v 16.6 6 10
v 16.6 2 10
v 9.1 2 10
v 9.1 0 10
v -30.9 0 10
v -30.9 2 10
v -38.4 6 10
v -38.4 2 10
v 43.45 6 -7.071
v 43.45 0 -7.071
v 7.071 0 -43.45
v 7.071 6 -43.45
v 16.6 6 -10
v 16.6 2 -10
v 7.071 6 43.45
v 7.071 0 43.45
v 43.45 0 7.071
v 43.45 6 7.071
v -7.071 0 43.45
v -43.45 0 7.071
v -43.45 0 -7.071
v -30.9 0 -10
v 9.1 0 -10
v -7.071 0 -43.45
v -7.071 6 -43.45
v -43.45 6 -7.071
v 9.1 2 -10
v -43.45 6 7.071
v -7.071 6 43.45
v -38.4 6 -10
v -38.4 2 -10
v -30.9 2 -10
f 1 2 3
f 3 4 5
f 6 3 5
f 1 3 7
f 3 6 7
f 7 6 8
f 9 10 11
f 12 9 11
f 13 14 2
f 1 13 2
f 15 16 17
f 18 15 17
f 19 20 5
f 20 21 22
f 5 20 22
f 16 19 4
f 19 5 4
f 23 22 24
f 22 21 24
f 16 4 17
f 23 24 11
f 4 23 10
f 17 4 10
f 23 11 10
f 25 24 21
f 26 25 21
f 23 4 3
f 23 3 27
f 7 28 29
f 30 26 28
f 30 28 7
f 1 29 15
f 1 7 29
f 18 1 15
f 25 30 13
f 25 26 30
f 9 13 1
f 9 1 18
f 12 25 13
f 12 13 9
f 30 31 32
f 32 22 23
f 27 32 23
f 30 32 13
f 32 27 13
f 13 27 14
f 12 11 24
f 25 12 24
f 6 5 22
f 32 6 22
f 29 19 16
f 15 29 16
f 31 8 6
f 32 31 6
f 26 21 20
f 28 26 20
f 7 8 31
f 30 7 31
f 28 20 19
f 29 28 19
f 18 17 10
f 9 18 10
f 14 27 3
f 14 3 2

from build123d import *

# Parameters (mm, degrees)
BOSS_EXTRUDE1_DEPTH = 6
SKETCH1_3_W         = 7.5
SKETCH1_3_H         = 20
BOSS_EXTRUDE2_DEPTH = 2


with BuildPart() as part:
    # Sketch1 → Boss-Extrude1 (new body)
    with BuildSketch(Plane(origin=(0, 0, 0), x_dir=(1, 0, 0), z_dir=(0, 1, 0))):
        Polygon((43.450252532, 7.071067812), (7.071067812, 43.450252532), (-7.071067812, 43.450252532), (-43.450252532, 7.071067812), (-43.450252532, -7.071067812), (-7.071067812, -43.450252532), (7.071067812, -43.450252532), (43.450252532, -7.071067812), align=None)
        Polygon((-30.9, -10), (-38.4, -10), (-38.4, 10), (-30.9, 10), (9.1, 10), (16.6, 10), (16.6, -10), (9.1, -10), align=None, mode=Mode.SUBTRACT)
    extrude(amount=BOSS_EXTRUDE1_DEPTH)

    # Sketch1<3> → Boss-Extrude2 (add)
    with BuildSketch(Plane(origin=(0, 0, 0), x_dir=(1, 0, 0), z_dir=(0, 1, 0))):
        with Locations((-34.65, 0)):
            Rectangle(SKETCH1_3_W, SKETCH1_3_H)
        with Locations((12.85, 0)):
            Rectangle(SKETCH1_3_W, SKETCH1_3_H)
    extrude(amount=BOSS_EXTRUDE2_DEPTH)


solid = part.part
